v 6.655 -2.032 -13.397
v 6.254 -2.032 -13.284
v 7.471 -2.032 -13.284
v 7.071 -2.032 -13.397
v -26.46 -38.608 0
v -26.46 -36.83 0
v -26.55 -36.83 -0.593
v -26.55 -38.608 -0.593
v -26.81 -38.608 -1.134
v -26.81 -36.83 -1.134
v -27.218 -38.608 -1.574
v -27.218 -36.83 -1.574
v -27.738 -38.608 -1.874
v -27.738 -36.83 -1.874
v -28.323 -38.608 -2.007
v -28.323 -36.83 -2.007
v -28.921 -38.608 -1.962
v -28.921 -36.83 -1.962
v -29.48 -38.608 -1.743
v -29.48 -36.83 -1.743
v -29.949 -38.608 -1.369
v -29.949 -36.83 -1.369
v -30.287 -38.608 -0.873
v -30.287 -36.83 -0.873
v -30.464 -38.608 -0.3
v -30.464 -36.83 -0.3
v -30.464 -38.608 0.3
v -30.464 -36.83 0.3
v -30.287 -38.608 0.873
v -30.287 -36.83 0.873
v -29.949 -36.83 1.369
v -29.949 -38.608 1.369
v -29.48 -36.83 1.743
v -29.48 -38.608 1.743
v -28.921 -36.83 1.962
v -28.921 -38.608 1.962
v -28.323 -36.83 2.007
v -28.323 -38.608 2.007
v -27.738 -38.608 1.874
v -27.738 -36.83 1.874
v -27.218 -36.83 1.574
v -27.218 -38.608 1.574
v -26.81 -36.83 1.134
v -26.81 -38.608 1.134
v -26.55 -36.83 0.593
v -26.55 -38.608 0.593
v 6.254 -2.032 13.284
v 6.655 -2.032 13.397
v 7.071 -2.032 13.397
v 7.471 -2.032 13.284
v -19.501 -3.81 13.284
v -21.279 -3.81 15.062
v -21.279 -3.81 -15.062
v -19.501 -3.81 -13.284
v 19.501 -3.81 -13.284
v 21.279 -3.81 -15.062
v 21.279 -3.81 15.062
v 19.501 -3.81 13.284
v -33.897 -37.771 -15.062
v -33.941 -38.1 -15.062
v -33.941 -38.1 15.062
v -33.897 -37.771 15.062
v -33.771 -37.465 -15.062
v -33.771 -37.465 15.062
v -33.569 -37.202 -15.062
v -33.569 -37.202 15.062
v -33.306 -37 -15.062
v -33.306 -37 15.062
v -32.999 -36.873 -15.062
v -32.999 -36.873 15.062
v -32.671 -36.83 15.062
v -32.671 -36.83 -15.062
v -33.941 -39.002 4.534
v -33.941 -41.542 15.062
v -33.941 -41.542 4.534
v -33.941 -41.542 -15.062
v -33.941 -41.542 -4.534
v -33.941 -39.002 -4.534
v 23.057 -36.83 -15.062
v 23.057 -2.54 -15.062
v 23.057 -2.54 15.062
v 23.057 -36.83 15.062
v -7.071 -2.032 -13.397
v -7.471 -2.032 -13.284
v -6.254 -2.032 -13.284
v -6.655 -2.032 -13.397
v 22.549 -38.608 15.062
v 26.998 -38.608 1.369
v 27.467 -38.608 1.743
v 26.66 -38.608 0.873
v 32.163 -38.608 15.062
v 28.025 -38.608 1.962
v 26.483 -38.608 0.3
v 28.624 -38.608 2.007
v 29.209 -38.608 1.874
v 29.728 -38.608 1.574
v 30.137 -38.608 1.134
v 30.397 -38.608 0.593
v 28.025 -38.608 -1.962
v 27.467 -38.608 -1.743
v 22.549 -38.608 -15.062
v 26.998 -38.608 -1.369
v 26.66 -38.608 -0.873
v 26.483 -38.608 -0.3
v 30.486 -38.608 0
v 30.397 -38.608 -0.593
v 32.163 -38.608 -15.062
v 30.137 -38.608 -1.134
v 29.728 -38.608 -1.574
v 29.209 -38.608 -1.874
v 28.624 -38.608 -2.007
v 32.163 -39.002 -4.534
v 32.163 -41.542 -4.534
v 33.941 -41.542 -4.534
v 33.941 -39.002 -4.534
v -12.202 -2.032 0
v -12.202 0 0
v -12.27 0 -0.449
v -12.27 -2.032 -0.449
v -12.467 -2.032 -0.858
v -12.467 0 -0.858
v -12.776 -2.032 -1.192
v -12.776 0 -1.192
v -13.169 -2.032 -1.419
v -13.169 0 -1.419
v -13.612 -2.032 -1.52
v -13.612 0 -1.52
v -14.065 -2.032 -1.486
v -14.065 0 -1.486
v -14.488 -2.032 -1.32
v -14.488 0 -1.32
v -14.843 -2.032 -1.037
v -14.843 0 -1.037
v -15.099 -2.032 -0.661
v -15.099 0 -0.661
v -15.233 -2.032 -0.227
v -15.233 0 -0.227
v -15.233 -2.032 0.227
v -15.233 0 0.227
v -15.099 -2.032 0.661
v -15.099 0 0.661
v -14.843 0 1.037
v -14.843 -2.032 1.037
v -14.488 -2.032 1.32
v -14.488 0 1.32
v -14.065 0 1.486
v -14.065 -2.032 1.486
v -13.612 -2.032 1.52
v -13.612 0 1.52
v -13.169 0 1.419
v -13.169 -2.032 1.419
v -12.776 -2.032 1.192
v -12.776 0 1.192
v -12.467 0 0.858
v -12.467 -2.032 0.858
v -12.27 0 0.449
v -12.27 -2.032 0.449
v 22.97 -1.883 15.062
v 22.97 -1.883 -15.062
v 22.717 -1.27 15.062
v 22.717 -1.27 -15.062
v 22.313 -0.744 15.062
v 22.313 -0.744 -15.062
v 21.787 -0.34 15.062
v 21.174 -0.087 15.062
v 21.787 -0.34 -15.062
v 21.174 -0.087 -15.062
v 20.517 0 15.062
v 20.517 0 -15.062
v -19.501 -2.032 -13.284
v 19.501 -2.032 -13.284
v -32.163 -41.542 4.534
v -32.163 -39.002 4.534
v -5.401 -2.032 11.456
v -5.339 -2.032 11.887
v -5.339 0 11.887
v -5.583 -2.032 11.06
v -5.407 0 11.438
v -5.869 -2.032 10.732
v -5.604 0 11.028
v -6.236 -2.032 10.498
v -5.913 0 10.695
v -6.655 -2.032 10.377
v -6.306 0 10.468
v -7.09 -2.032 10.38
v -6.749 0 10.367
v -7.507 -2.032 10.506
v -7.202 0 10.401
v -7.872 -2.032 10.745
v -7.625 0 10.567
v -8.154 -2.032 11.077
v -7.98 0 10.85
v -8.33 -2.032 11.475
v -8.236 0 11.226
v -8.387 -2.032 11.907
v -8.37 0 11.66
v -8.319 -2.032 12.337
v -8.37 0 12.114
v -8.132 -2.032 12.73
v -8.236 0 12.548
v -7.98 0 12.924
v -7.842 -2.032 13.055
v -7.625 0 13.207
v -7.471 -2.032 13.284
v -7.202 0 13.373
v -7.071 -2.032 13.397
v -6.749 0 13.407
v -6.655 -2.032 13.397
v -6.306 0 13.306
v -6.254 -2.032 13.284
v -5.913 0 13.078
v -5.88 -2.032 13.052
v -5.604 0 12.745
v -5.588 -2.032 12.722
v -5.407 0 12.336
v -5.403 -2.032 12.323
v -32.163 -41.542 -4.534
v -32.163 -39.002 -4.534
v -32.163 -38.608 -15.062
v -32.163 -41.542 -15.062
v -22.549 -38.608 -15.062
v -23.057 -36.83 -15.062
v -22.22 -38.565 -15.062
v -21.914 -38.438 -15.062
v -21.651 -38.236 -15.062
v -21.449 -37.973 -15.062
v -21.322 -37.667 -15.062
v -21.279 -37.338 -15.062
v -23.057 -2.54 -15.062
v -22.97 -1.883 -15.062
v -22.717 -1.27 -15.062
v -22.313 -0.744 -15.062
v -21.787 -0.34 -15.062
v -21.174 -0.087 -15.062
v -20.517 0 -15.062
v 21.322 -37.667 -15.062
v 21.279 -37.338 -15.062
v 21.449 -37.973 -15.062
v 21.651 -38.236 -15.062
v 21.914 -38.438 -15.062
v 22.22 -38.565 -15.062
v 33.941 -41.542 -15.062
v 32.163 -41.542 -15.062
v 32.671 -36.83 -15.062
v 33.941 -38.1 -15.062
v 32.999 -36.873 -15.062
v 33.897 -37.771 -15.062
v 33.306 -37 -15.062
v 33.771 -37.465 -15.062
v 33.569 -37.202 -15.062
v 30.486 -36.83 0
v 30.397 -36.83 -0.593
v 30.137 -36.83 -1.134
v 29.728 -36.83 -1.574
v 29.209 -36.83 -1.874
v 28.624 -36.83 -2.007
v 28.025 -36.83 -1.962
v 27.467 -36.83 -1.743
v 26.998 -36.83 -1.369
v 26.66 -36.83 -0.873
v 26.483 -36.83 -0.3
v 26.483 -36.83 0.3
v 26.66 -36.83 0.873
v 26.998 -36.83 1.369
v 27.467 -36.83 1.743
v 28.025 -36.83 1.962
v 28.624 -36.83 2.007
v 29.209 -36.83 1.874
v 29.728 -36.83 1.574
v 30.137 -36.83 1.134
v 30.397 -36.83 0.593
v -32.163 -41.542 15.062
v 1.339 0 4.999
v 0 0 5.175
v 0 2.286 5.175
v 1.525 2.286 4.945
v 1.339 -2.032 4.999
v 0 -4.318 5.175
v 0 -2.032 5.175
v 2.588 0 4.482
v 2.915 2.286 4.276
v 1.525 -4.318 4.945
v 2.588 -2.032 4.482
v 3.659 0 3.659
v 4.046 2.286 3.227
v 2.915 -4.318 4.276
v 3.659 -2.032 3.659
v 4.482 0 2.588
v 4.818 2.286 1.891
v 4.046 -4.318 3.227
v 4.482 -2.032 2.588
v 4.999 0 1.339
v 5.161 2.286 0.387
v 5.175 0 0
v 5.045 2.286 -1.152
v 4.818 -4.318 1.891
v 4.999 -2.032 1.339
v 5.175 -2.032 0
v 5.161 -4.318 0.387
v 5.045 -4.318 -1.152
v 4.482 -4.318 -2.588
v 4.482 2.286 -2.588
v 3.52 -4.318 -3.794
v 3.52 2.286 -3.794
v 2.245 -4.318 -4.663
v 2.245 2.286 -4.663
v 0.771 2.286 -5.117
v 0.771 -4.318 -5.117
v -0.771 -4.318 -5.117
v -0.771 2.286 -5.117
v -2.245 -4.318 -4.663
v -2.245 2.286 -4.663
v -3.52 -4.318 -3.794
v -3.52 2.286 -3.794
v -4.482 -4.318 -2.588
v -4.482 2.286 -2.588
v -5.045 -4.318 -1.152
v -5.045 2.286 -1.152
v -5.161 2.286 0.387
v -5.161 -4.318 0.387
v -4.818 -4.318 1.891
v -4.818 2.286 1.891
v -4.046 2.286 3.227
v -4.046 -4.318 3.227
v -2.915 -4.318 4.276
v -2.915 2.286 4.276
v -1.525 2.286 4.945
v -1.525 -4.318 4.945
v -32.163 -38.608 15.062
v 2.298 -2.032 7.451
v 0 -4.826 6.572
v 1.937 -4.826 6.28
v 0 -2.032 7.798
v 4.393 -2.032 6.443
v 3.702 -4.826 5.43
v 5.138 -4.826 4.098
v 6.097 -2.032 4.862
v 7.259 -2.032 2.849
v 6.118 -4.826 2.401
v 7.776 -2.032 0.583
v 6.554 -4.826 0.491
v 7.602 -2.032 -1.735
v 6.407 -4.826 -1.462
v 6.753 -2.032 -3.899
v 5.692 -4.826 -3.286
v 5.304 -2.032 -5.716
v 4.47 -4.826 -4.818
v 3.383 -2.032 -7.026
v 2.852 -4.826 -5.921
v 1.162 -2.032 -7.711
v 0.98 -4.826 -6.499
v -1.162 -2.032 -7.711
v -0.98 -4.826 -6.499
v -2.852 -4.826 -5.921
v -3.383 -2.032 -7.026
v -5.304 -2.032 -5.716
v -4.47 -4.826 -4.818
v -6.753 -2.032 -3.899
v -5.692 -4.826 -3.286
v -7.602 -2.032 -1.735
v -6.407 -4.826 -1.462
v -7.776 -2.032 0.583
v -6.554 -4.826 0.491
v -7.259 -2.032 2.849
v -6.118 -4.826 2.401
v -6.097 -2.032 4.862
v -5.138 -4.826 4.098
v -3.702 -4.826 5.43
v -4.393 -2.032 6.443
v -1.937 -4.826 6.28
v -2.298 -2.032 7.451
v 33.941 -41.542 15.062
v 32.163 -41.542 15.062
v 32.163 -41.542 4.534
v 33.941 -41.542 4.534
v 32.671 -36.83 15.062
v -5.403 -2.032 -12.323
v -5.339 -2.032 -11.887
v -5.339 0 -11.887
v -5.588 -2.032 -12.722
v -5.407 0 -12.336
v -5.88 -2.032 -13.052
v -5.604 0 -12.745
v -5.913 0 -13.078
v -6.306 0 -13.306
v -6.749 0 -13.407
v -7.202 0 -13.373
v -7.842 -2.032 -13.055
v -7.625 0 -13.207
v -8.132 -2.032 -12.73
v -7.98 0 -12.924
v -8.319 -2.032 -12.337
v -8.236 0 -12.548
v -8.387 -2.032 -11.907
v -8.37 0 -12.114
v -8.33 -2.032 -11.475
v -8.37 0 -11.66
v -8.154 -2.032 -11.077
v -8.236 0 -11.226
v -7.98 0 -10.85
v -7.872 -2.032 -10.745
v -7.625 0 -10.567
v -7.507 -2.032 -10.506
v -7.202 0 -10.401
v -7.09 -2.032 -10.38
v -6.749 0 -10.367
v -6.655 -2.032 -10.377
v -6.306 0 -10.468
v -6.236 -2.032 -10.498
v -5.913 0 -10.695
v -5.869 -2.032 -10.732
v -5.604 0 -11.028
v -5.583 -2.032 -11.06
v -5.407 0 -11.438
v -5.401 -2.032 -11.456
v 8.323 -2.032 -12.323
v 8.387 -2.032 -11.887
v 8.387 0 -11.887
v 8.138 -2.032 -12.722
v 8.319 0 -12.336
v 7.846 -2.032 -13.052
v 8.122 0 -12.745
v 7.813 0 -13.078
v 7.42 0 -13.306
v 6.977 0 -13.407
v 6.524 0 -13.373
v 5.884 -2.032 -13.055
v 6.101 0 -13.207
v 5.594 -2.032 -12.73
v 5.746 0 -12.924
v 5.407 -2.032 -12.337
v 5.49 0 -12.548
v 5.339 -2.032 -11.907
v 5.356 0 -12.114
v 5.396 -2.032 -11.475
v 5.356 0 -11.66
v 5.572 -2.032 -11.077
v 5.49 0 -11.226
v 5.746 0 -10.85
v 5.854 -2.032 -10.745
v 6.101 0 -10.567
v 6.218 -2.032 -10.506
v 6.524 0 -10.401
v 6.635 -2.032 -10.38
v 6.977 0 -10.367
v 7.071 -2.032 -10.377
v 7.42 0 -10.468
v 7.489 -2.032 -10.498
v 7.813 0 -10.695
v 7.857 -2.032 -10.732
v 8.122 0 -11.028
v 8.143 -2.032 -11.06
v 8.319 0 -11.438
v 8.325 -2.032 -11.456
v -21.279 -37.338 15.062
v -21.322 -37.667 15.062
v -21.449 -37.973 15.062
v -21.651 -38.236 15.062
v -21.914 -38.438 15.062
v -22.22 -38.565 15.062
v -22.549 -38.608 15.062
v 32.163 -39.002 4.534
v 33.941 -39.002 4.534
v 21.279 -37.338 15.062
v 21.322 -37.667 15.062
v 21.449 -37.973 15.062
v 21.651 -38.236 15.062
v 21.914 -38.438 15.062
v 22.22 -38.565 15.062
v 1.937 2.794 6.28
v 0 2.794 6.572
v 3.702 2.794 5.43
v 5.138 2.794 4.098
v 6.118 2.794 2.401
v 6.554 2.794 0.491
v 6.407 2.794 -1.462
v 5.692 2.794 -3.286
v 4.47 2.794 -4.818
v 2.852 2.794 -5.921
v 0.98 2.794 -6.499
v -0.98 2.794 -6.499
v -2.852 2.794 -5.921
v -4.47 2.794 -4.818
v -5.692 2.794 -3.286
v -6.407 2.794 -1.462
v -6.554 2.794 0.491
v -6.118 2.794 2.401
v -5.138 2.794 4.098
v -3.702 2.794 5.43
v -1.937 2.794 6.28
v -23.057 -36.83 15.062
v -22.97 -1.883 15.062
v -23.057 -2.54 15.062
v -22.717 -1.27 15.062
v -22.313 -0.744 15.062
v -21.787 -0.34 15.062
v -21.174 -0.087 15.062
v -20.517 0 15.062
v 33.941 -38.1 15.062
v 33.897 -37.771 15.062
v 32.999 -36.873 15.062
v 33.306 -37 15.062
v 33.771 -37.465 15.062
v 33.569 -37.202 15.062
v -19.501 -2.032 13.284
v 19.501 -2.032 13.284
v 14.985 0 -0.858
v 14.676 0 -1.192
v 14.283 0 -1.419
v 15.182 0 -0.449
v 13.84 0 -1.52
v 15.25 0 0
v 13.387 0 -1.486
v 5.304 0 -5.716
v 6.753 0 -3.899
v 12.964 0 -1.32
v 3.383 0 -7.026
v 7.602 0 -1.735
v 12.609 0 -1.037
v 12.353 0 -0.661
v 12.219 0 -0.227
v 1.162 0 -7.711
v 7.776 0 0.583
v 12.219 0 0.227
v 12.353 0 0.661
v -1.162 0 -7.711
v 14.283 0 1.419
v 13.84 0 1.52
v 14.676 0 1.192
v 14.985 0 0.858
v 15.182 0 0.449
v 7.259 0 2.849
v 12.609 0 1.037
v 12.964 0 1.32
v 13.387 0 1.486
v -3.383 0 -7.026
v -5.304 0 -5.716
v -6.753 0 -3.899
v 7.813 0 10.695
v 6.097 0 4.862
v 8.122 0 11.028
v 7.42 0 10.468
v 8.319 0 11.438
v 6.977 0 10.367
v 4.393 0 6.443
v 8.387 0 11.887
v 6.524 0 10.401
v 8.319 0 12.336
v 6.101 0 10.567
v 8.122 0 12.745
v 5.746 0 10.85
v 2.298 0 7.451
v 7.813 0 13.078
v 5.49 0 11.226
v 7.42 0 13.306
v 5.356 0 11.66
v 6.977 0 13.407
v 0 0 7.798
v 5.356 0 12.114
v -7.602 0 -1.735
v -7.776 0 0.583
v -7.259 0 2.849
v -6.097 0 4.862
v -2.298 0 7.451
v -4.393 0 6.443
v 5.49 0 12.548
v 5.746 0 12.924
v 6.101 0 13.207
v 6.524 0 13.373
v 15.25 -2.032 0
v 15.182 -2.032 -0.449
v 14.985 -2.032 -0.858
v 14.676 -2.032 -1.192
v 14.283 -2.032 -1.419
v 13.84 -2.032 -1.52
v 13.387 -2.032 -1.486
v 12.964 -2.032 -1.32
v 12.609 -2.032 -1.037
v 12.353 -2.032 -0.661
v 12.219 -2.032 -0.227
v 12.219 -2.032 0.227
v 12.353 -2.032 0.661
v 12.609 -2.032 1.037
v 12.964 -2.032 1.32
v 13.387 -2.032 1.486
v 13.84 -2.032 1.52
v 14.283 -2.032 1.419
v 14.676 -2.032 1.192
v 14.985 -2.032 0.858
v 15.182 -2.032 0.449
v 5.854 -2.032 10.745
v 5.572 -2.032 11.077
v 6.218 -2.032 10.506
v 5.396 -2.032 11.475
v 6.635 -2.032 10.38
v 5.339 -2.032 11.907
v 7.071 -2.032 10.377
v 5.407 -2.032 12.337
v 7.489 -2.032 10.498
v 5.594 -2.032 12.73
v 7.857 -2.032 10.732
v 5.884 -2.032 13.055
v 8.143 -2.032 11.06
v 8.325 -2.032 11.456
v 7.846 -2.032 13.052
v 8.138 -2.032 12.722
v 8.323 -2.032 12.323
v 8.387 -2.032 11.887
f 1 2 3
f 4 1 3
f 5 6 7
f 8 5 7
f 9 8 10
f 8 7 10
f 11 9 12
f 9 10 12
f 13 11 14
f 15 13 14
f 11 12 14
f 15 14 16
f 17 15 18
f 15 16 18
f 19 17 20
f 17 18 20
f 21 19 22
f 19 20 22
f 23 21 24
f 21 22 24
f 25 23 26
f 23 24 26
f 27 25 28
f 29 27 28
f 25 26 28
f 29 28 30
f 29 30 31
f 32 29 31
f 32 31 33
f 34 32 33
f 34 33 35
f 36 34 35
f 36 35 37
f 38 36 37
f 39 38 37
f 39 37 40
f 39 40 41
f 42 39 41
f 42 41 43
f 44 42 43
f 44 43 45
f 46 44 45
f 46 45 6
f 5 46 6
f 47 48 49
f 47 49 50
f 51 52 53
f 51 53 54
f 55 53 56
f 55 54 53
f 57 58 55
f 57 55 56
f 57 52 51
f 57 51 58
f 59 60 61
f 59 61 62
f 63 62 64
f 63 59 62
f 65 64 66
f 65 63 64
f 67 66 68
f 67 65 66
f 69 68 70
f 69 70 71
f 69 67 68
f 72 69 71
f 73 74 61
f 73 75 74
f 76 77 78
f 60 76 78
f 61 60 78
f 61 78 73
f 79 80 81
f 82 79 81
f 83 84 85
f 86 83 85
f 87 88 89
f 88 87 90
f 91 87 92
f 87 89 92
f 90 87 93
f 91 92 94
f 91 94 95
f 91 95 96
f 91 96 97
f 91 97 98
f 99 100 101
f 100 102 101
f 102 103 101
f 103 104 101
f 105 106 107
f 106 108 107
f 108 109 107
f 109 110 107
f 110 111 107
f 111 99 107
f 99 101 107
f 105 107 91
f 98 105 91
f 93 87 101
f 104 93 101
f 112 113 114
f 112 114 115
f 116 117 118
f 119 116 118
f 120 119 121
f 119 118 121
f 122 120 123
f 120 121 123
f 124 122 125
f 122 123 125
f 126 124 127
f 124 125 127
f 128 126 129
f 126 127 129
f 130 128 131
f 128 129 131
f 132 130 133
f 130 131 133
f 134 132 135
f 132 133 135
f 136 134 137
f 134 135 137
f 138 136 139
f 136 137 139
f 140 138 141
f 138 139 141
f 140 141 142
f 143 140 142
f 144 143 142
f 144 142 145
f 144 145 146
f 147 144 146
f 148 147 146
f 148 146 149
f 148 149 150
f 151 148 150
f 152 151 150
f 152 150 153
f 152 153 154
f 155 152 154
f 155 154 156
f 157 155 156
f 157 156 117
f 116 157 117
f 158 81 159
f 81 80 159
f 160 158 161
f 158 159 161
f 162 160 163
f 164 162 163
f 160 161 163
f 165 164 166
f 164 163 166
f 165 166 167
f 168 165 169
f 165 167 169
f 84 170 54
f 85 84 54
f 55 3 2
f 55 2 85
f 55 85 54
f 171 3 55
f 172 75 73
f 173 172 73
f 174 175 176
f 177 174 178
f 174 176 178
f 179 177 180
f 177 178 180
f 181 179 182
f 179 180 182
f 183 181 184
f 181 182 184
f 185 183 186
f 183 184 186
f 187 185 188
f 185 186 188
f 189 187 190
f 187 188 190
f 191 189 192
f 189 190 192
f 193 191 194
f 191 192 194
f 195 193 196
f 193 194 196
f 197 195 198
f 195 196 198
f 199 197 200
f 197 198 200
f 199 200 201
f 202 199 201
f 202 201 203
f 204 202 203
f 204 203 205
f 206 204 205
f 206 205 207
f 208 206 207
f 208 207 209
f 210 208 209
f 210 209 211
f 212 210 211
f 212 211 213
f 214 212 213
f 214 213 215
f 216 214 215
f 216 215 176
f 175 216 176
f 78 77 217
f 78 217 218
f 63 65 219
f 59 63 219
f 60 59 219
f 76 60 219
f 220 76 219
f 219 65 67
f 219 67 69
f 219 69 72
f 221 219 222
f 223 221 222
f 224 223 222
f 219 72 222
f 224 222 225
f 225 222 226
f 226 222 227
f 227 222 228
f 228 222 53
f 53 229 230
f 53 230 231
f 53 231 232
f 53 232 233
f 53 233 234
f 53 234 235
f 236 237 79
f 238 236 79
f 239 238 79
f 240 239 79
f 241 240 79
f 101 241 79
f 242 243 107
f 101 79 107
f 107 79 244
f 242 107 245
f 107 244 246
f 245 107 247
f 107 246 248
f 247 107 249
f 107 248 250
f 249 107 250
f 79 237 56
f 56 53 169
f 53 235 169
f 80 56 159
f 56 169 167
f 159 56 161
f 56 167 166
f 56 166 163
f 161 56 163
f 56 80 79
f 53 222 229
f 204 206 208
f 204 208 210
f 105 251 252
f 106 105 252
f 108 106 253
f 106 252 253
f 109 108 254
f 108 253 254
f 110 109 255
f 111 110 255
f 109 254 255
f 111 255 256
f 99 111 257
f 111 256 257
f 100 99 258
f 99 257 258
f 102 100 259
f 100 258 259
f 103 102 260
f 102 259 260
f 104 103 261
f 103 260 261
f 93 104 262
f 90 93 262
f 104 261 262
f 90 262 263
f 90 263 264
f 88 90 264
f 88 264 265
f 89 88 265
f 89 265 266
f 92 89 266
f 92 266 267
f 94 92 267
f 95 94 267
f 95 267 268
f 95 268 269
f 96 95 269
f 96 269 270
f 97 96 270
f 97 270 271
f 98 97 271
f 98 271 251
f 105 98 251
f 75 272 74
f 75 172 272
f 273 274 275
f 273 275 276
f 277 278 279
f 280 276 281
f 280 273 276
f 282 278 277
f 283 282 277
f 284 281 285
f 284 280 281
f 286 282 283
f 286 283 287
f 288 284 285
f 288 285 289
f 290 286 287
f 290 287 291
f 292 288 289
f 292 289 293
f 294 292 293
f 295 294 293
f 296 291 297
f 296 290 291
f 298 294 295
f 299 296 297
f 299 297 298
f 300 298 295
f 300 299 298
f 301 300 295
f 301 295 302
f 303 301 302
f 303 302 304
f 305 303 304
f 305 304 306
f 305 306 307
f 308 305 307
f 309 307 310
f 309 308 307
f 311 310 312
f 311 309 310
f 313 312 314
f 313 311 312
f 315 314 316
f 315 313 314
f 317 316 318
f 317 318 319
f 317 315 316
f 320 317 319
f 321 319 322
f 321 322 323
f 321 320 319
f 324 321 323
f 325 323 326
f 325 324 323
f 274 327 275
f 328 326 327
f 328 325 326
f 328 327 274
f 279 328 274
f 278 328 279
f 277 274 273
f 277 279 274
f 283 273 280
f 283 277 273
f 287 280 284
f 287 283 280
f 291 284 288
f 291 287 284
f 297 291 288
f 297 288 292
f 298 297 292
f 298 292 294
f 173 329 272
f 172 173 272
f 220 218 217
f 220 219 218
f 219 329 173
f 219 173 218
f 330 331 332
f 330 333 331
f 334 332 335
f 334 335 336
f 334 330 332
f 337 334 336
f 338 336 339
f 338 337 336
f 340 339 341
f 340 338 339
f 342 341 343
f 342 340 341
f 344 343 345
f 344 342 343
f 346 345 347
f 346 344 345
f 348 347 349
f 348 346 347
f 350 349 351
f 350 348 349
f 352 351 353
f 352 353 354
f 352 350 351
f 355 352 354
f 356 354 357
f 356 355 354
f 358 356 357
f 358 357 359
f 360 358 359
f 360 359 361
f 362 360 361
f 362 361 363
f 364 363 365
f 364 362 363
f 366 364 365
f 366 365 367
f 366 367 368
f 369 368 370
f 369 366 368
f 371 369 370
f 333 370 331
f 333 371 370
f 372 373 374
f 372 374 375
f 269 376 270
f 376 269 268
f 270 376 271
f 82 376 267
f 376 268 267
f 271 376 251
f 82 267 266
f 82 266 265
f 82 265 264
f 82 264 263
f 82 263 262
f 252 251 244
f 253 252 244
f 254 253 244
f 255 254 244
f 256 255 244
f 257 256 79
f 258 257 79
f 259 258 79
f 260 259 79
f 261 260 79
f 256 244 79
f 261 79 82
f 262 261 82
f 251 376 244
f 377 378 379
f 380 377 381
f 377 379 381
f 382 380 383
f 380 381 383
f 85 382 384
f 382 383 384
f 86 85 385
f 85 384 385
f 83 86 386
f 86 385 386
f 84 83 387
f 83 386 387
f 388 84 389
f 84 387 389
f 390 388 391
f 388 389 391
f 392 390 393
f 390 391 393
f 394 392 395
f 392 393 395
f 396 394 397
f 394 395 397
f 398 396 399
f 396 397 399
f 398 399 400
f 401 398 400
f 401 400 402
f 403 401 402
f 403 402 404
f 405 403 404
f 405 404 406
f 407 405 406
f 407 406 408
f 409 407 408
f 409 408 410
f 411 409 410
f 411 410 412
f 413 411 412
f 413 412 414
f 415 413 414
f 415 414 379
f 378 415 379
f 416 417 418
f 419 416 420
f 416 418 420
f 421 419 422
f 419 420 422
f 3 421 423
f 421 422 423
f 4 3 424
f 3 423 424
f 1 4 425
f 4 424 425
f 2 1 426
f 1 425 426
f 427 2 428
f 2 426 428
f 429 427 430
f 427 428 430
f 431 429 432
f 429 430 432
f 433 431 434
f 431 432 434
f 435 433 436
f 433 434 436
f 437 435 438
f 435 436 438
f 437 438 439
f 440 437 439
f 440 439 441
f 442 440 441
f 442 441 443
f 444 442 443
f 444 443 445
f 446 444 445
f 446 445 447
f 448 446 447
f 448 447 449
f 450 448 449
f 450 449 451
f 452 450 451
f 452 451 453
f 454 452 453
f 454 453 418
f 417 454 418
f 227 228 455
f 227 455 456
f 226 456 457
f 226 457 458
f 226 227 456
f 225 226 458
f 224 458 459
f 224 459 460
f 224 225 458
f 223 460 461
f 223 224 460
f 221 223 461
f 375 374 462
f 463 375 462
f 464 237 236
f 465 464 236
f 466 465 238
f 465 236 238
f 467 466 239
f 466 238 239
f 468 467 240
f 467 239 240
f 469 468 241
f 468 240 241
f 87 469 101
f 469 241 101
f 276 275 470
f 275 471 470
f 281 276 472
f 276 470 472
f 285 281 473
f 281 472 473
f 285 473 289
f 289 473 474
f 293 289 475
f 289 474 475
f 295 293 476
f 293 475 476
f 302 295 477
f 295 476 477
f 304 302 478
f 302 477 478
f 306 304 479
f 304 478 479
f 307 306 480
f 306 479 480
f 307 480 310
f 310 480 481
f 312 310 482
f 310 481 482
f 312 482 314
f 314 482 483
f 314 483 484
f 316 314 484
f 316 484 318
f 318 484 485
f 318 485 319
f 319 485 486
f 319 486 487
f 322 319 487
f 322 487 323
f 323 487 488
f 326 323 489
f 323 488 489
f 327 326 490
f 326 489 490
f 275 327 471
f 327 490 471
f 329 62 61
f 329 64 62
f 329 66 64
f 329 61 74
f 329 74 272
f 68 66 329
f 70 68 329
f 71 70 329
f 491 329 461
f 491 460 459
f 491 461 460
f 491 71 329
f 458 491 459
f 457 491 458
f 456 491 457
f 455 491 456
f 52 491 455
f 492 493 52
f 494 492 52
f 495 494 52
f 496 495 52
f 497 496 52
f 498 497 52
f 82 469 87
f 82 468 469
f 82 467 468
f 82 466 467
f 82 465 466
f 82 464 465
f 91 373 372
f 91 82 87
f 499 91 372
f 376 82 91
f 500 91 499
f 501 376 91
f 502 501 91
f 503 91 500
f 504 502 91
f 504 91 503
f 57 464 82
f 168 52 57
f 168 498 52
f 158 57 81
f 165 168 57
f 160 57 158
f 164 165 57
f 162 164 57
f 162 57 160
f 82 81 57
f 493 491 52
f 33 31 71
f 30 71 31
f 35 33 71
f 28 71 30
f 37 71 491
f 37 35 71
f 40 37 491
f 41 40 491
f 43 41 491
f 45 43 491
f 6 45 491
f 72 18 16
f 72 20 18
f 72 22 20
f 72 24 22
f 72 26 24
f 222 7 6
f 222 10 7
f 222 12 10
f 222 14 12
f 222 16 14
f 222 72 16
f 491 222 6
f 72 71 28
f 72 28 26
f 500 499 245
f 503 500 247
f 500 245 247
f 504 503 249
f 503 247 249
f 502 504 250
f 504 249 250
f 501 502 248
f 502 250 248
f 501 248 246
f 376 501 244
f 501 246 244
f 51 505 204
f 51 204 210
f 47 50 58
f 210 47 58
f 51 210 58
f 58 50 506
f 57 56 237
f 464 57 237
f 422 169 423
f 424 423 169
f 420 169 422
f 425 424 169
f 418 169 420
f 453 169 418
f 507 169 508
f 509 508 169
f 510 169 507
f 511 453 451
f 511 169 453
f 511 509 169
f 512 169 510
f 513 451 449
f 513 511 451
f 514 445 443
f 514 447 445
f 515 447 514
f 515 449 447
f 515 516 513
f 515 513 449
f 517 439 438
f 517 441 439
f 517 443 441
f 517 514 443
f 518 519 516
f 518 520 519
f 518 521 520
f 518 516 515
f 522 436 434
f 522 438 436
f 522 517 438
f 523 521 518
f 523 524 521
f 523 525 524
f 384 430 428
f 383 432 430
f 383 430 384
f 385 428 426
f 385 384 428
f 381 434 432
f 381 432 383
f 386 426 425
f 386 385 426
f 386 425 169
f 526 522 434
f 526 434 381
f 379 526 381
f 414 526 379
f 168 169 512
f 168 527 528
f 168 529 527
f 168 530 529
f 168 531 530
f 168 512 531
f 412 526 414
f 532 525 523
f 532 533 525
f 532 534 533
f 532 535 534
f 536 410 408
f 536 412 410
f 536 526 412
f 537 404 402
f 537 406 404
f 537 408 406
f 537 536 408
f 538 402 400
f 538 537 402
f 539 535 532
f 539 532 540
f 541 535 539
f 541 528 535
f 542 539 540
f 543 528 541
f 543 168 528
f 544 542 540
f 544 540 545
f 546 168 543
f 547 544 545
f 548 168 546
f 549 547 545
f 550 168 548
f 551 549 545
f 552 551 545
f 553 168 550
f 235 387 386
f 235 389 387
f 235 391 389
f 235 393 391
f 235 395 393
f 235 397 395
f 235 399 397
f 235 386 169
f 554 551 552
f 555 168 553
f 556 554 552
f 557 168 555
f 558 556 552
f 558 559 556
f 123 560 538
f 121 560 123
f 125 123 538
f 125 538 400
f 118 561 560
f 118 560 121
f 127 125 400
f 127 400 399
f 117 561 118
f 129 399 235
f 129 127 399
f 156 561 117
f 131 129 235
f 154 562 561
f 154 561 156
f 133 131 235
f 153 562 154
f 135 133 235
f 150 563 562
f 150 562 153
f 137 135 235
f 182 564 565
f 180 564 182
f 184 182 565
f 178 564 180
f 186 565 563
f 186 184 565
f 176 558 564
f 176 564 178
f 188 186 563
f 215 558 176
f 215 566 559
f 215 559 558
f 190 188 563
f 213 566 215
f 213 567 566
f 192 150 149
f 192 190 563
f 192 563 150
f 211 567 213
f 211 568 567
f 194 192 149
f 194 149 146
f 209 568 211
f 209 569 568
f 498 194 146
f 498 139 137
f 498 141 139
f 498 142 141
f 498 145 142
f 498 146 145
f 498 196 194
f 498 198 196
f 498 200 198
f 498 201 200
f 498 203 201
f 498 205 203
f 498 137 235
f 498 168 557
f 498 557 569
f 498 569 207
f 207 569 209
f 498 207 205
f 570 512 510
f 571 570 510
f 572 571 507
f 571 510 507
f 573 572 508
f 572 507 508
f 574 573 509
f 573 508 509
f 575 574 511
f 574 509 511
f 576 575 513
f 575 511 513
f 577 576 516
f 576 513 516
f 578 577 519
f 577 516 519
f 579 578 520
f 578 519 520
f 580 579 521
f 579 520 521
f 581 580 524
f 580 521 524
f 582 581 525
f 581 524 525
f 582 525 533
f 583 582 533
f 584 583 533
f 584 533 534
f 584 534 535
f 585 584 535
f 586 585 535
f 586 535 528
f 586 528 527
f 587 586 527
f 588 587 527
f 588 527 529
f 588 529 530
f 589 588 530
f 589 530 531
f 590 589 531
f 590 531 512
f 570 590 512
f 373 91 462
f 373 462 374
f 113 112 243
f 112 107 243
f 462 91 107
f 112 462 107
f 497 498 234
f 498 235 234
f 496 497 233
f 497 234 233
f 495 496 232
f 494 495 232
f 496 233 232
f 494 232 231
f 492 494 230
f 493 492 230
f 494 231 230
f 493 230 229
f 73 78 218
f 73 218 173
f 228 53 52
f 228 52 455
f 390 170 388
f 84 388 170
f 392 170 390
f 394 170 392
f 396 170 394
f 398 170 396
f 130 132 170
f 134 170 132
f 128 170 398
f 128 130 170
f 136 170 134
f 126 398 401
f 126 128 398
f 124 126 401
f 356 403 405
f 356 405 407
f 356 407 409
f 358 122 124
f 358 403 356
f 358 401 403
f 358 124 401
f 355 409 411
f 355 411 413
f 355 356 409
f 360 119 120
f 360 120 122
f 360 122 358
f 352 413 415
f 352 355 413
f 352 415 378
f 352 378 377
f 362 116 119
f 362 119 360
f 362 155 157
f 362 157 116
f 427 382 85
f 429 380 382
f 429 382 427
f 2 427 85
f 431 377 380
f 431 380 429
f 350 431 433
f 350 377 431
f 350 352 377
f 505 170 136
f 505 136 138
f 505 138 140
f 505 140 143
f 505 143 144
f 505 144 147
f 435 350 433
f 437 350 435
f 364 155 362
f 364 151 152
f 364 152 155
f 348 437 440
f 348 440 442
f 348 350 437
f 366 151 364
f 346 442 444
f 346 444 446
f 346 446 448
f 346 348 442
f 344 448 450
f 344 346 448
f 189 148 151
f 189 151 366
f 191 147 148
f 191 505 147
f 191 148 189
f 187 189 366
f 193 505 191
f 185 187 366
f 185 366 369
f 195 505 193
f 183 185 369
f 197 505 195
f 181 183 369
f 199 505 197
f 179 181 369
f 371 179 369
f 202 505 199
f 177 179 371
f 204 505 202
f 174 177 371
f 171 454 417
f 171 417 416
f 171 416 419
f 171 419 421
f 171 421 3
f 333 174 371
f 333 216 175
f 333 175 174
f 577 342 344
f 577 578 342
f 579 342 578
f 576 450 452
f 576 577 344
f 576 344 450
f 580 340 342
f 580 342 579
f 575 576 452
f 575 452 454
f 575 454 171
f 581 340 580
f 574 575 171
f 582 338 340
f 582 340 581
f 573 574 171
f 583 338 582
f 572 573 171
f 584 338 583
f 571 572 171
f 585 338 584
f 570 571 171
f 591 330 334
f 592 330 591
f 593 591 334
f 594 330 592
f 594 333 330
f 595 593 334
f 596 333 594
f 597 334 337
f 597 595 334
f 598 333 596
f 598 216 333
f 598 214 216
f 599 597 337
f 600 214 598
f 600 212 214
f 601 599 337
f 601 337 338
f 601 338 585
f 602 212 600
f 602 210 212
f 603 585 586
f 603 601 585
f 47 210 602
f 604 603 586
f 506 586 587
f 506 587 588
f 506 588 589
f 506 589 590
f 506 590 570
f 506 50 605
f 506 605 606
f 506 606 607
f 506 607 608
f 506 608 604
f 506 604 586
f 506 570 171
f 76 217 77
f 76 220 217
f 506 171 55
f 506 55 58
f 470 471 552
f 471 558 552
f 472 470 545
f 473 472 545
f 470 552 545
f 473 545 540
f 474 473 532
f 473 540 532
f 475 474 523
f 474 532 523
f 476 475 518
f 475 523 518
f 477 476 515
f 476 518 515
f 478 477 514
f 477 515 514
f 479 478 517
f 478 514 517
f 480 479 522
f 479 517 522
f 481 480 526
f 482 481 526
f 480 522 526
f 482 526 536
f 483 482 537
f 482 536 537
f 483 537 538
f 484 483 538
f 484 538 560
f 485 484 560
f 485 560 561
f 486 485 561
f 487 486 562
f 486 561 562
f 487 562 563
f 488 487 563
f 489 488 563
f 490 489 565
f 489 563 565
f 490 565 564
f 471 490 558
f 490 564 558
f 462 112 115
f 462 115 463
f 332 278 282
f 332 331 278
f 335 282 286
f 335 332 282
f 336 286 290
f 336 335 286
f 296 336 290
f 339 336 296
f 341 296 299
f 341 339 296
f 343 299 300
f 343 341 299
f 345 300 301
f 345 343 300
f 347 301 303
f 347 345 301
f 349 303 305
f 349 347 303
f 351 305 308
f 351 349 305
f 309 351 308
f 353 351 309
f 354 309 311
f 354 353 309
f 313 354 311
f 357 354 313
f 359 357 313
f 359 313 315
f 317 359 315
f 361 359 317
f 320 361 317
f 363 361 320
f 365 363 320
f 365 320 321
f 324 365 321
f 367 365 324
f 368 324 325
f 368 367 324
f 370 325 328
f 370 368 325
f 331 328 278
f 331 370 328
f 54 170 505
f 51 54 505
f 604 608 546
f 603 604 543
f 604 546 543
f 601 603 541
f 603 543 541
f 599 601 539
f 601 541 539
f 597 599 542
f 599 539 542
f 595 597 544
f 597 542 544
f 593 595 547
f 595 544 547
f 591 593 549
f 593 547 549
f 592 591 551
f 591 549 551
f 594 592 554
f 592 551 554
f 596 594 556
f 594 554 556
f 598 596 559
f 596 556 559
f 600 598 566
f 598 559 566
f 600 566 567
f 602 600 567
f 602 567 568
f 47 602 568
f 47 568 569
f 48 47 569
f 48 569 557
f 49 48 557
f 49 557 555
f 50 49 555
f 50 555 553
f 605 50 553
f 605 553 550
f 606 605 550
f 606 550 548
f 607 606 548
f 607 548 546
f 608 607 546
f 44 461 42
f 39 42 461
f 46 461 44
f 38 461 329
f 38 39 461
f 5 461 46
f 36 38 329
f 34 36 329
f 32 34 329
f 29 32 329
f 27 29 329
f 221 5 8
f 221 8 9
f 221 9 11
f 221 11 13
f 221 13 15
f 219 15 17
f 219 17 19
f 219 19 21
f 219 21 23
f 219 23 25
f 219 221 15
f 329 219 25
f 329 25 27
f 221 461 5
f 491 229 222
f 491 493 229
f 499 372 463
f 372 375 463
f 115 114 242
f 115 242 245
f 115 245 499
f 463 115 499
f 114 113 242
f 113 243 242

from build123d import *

# Parameters (mm, degrees)
SKETCH1_R                       = 7.7978
SKETCH1_R_2                     = 6.57225
SKETCH1_R_3                     = 5.17525
BOSS_EXTRUDE1_DEPTH             = 2.032
BOSS_EXTRUDE2_REACH             = 17.062
BOSS_EXTRUDE2_DIRECTION_2_REACH = 17.062
SKETCH4_W                       = 3.302
SKETCH4_H                       = 2.032
BOSS_EXTRUDE3_DEPTH             = 30.1244
FILLET1_R                       = 2.54
FILLET2_R                       = 2.54
SKETCH5_W                       = 9.0678
SKETCH5_H                       = 2.54
CUT_EXTRUDE1_DEPTH              = 116.84
SKETCH6_R                       = 2.01295
CUT_EXTRUDE2_DEPTH              = 5.7117
SKETCH7_R                       = 1.524
CUT_EXTRUDE3_DEPTH              = 42.5417
SKETCH9_W                       = 42.5577
SKETCH9_H                       = 30.1244
SKETCH9_W_2                     = 39.0017
SKETCH9_H_2                     = 26.5684
BOSS_EXTRUDE4_DEPTH             = 1.778


with BuildPart() as part:
    # Sketch1 → Boss-Extrude1 (new body)
    with BuildSketch(Plane(origin=(0, 0, 0), x_dir=(1, 0, 0), z_dir=(0, 1, 0))):
        with BuildLine():
            ThreePointArc((-23.05685, 9.9822), (-21.568952448, 13.574302448), (-17.97685, 15.0622))
            Line((-17.97685, 15.0622), (17.97685, 15.0622))
            ThreePointArc((17.97685, 15.0622), (21.568952448, 13.574302448), (23.05685, 9.9822))
            Line((23.05685, 9.9822), (23.05685, -9.9822))
            ThreePointArc((23.05685, -9.9822), (21.568952448, -13.574302448), (17.97685, -15.0622))
            Line((17.97685, -15.0622), (-17.97685, -15.0622))
            ThreePointArc((-17.97685, -15.0622), (-21.568952448, -13.574302448), (-23.05685, -9.9822))
            Line((-23.05685, -9.9822), (-23.05685, 9.9822))
        make_face()
        Circle(SKETCH1_R, mode=Mode.SUBTRACT)
        Circle(SKETCH1_R)
        Circle(SKETCH1_R_2, mode=Mode.SUBTRACT)
        Circle(SKETCH1_R_2)
        Circle(SKETCH1_R_3, mode=Mode.SUBTRACT)
    extrude(amount=-BOSS_EXTRUDE1_DEPTH)

    # Sketch2 → Revolve1 (revolve)
    with BuildSketch(Plane(origin=(0, 0, 0), x_dir=(0, 0, -1), z_dir=(1, 0, 0))):
        Polygon((-5.17525, 2.286), (-6.57225, 2.794), (-7.7978, 0), (-5.17525, 0), align=None)
    revolve1 = revolve(axis=Axis((0, 0, 0), (0, 1, 0)))

    # Boss-Extrude2: up to this face of the body (flat: up to its plane)
    boss_extrude2_end = Plane(part.part.faces().sort_by_distance((0, -1.016, 15.0622))[0])
    # Sketch3 → Boss-Extrude2 (add, up to the picked face)
    with BuildSketch(Plane.XY, mode=Mode.PRIVATE) as boss_extrude2_sk1:
        with BuildLine():
            ThreePointArc((-23.05685, -1.27), (-22.684875612, -0.371974388), (-21.78685, 0))
            Line((-21.78685, 0), (-21.27885, 0))
            Line((-21.27885, 0), (-21.27885, -37.338))
            ThreePointArc((-21.27885, -37.338), (-21.650824388, -38.236025612), (-22.54885, -38.608))
            Line((-22.54885, -38.608), (-23.05685, -38.608))
            Line((-23.05685, -38.608), (-32.16275, -38.608))
            Line((-32.16275, -38.608), (-32.16275, -41.5417))
            Line((-32.16275, -41.5417), (-33.94075, -41.5417))
            Line((-33.94075, -41.5417), (-33.94075, -38.1))
            ThreePointArc((-33.94075, -38.1), (-33.568775612, -37.201974388), (-32.67075, -36.83))
            Line((-32.67075, -36.83), (-32.16275, -36.83))
            Line((-32.16275, -36.83), (-23.05685, -36.83))
            Line((-23.05685, -36.83), (-23.05685, -1.27))
        make_face()
    boss_extrude2_tool1 = split(extrude(boss_extrude2_sk1.sketch, amount=BOSS_EXTRUDE2_REACH, mode=Mode.PRIVATE), bisect_by=boss_extrude2_end, keep=Keep.BOTH, mode=Mode.PRIVATE)
    add(boss_extrude2_tool1.solids().sort_by_distance((-32.41675, -37.264285, 0))[0])
    # Sketch3 → Boss-Extrude2 (add, up to the picked face)
    with BuildSketch(Plane.XY, mode=Mode.PRIVATE) as boss_extrude2_sk2:
        with BuildLine():
            Line((21.27885, 0), (21.27885, -37.338))
            ThreePointArc((21.27885, -37.338), (21.650824388, -38.236025612), (22.54885, -38.608))
            Line((22.54885, -38.608), (23.05685, -38.608))
            Line((23.05685, -38.608), (32.16275, -38.608))
            Line((32.16275, -38.608), (32.16275, -41.5417))
            Line((32.16275, -41.5417), (33.94075, -41.5417))
            Line((33.94075, -41.5417), (33.94075, -38.1))
            ThreePointArc((33.94075, -38.1), (33.568775612, -37.201974388), (32.67075, -36.83))
            Line((32.67075, -36.83), (32.16275, -36.83))
            Line((32.16275, -36.83), (23.05685, -36.83))
            Line((23.05685, -36.83), (23.05685, -1.27))
            ThreePointArc((23.05685, -1.27), (22.684875612, -0.371974388), (21.78685, 0))
            Line((21.78685, 0), (21.27885, 0))
        make_face()
    boss_extrude2_tool2 = split(extrude(boss_extrude2_sk2.sketch, amount=BOSS_EXTRUDE2_REACH, mode=Mode.PRIVATE), bisect_by=boss_extrude2_end, keep=Keep.BOTH, mode=Mode.PRIVATE)
    add(boss_extrude2_tool2.solids().sort_by_distance((27.6098, -38.173715, 0))[0])

    # Boss-Extrude2 direction 2: up to this face of the body (flat: up to its plane)
    boss_extrude2_direction_2_end = Plane(part.part.faces().sort_by_distance((0, -1.016, -15.0622))[0])
    # Sketch3 → Boss-Extrude2 direction 2 (add, up to the picked face)
    with BuildSketch(Plane.XY, mode=Mode.PRIVATE) as boss_extrude2_direction_2_sk1:
        with BuildLine():
            ThreePointArc((-23.05685, -1.27), (-22.684875612, -0.371974388), (-21.78685, 0))
            Line((-21.78685, 0), (-21.27885, 0))
            Line((-21.27885, 0), (-21.27885, -37.338))
            ThreePointArc((-21.27885, -37.338), (-21.650824388, -38.236025612), (-22.54885, -38.608))
            Line((-22.54885, -38.608), (-23.05685, -38.608))
            Line((-23.05685, -38.608), (-32.16275, -38.608))
            Line((-32.16275, -38.608), (-32.16275, -41.5417))
            Line((-32.16275, -41.5417), (-33.94075, -41.5417))
            Line((-33.94075, -41.5417), (-33.94075, -38.1))
            ThreePointArc((-33.94075, -38.1), (-33.568775612, -37.201974388), (-32.67075, -36.83))
            Line((-32.67075, -36.83), (-32.16275, -36.83))
            Line((-32.16275, -36.83), (-23.05685, -36.83))
            Line((-23.05685, -36.83), (-23.05685, -1.27))
        make_face()
    boss_extrude2_direction_2_tool1 = split(extrude(boss_extrude2_direction_2_sk1.sketch, amount=-BOSS_EXTRUDE2_DIRECTION_2_REACH, mode=Mode.PRIVATE), bisect_by=boss_extrude2_direction_2_end, keep=Keep.BOTH, mode=Mode.PRIVATE)
    add(boss_extrude2_direction_2_tool1.solids().sort_by_distance((-32.41675, -37.264285, 0))[0])
    # Sketch3 → Boss-Extrude2 direction 2 (add, up to the picked face)
    with BuildSketch(Plane.XY, mode=Mode.PRIVATE) as boss_extrude2_direction_2_sk2:
        with BuildLine():
            Line((21.27885, 0), (21.27885, -37.338))
            ThreePointArc((21.27885, -37.338), (21.650824388, -38.236025612), (22.54885, -38.608))
            Line((22.54885, -38.608), (23.05685, -38.608))
            Line((23.05685, -38.608), (32.16275, -38.608))
            Line((32.16275, -38.608), (32.16275, -41.5417))
            Line((32.16275, -41.5417), (33.94075, -41.5417))
            Line((33.94075, -41.5417), (33.94075, -38.1))
            ThreePointArc((33.94075, -38.1), (33.568775612, -37.201974388), (32.67075, -36.83))
            Line((32.67075, -36.83), (32.16275, -36.83))
            Line((32.16275, -36.83), (23.05685, -36.83))
            Line((23.05685, -36.83), (23.05685, -1.27))
            ThreePointArc((23.05685, -1.27), (22.684875612, -0.371974388), (21.78685, 0))
            Line((21.78685, 0), (21.27885, 0))
        make_face()
    boss_extrude2_direction_2_tool2 = split(extrude(boss_extrude2_direction_2_sk2.sketch, amount=-BOSS_EXTRUDE2_DIRECTION_2_REACH, mode=Mode.PRIVATE), bisect_by=boss_extrude2_direction_2_end, keep=Keep.BOTH, mode=Mode.PRIVATE)
    add(boss_extrude2_direction_2_tool2.solids().sort_by_distance((27.6098, -38.173715, 0))[0])

    # Sketch4 → Boss-Extrude3 (add)
    with BuildSketch(Plane.XY.offset(15.0622)):
        with BuildLine():
            ThreePointArc((-23.05685, -1.27), (-22.684875612, -0.371974388), (-21.78685, 0))
            Line((-21.78685, 0), (-23.05685, 0))
            Line((-23.05685, 0), (-23.05685, -1.27))
        make_face()
        with BuildLine():
            Line((-21.27885, -2.032), (-21.27885, 0))
            Line((-21.27885, 0), (-21.78685, 0))
            ThreePointArc((-21.78685, 0), (-22.684875612, -0.371974388), (-23.05685, -1.27))
            Line((-23.05685, -1.27), (-23.05685, -2.032))
            Line((-23.05685, -2.032), (-21.27885, -2.032))
        make_face()
        with Locations((-19.62785, -1.016)):
            Rectangle(SKETCH4_W, SKETCH4_H)
        Polygon((23.05685, 0), (21.27885, 0), (17.97685, 0), (17.97685, -2.032), (21.27885, -2.032), (23.05685, -2.032), align=None)
    extrude(amount=-BOSS_EXTRUDE3_DEPTH)

    # Fillet1
    fillet1_edges = [part.edges().sort_by_distance(p)[0] for p in [
        (23.05685, 0, 0),
    ]]
    fillet(fillet1_edges, radius=FILLET1_R)

    # Fillet2
    fillet2_edges = [part.edges().sort_by_distance(p)[0] for p in [
        (-23.05685, 0, 0),
    ]]
    fillet(fillet2_edges, radius=FILLET2_R)

    # Sketch5 → Cut-Extrude1 (cut)
    with BuildSketch(Plane.ZY.offset(33.94075)):
        with Locations((0, -40.2717)):
            Rectangle(SKETCH5_W, SKETCH5_H)
    extrude(amount=-CUT_EXTRUDE1_DEPTH, mode=Mode.SUBTRACT)

    # Sketch6 → Cut-Extrude2 (cut, through all)
    with BuildSketch(Plane(origin=(0, -36.83, 0), x_dir=(1, 0, 0), z_dir=(0, 1, 0))):
        with Locations((-28.4734, 0)):
            Circle(SKETCH6_R)
        with Locations((28.4734, 0)):
            Circle(SKETCH6_R)
    extrude(amount=-CUT_EXTRUDE2_DEPTH, mode=Mode.SUBTRACT)

    # Sketch7 → Cut-Extrude3 (cut, through all)
    with BuildSketch(Plane(origin=(0, 0, 0), x_dir=(1, 0, 0), z_dir=(0, 1, 0))):
        with Locations((13.725830849, 0)):
            Circle(SKETCH7_R)
        with Locations((-13.725830849, 0)):
            Circle(SKETCH7_R)
        with Locations((-6.862915424, -11.886918203)):
            Circle(SKETCH7_R)
        with Locations((6.862915424, 11.886918203)):
            Circle(SKETCH7_R)
        with Locations((-6.862915424, 11.886918203)):
            Circle(SKETCH7_R)
        with Locations((6.862915424, -11.886918203)):
            Circle(SKETCH7_R)
    extrude(amount=-CUT_EXTRUDE3_DEPTH, mode=Mode.SUBTRACT)

    # Mirror4: Revolve1 across plane
    add(revolve1.mirror(Plane.ZX.offset(-1.016)))

    # Sketch9 → Boss-Extrude4 (add)
    with BuildSketch(Plane.XZ.offset(2.032)):
        Rectangle(SKETCH9_W, SKETCH9_H)
        Rectangle(SKETCH9_W_2, SKETCH9_H_2, mode=Mode.SUBTRACT)
    extrude(amount=BOSS_EXTRUDE4_DEPTH)


solid = part.part
